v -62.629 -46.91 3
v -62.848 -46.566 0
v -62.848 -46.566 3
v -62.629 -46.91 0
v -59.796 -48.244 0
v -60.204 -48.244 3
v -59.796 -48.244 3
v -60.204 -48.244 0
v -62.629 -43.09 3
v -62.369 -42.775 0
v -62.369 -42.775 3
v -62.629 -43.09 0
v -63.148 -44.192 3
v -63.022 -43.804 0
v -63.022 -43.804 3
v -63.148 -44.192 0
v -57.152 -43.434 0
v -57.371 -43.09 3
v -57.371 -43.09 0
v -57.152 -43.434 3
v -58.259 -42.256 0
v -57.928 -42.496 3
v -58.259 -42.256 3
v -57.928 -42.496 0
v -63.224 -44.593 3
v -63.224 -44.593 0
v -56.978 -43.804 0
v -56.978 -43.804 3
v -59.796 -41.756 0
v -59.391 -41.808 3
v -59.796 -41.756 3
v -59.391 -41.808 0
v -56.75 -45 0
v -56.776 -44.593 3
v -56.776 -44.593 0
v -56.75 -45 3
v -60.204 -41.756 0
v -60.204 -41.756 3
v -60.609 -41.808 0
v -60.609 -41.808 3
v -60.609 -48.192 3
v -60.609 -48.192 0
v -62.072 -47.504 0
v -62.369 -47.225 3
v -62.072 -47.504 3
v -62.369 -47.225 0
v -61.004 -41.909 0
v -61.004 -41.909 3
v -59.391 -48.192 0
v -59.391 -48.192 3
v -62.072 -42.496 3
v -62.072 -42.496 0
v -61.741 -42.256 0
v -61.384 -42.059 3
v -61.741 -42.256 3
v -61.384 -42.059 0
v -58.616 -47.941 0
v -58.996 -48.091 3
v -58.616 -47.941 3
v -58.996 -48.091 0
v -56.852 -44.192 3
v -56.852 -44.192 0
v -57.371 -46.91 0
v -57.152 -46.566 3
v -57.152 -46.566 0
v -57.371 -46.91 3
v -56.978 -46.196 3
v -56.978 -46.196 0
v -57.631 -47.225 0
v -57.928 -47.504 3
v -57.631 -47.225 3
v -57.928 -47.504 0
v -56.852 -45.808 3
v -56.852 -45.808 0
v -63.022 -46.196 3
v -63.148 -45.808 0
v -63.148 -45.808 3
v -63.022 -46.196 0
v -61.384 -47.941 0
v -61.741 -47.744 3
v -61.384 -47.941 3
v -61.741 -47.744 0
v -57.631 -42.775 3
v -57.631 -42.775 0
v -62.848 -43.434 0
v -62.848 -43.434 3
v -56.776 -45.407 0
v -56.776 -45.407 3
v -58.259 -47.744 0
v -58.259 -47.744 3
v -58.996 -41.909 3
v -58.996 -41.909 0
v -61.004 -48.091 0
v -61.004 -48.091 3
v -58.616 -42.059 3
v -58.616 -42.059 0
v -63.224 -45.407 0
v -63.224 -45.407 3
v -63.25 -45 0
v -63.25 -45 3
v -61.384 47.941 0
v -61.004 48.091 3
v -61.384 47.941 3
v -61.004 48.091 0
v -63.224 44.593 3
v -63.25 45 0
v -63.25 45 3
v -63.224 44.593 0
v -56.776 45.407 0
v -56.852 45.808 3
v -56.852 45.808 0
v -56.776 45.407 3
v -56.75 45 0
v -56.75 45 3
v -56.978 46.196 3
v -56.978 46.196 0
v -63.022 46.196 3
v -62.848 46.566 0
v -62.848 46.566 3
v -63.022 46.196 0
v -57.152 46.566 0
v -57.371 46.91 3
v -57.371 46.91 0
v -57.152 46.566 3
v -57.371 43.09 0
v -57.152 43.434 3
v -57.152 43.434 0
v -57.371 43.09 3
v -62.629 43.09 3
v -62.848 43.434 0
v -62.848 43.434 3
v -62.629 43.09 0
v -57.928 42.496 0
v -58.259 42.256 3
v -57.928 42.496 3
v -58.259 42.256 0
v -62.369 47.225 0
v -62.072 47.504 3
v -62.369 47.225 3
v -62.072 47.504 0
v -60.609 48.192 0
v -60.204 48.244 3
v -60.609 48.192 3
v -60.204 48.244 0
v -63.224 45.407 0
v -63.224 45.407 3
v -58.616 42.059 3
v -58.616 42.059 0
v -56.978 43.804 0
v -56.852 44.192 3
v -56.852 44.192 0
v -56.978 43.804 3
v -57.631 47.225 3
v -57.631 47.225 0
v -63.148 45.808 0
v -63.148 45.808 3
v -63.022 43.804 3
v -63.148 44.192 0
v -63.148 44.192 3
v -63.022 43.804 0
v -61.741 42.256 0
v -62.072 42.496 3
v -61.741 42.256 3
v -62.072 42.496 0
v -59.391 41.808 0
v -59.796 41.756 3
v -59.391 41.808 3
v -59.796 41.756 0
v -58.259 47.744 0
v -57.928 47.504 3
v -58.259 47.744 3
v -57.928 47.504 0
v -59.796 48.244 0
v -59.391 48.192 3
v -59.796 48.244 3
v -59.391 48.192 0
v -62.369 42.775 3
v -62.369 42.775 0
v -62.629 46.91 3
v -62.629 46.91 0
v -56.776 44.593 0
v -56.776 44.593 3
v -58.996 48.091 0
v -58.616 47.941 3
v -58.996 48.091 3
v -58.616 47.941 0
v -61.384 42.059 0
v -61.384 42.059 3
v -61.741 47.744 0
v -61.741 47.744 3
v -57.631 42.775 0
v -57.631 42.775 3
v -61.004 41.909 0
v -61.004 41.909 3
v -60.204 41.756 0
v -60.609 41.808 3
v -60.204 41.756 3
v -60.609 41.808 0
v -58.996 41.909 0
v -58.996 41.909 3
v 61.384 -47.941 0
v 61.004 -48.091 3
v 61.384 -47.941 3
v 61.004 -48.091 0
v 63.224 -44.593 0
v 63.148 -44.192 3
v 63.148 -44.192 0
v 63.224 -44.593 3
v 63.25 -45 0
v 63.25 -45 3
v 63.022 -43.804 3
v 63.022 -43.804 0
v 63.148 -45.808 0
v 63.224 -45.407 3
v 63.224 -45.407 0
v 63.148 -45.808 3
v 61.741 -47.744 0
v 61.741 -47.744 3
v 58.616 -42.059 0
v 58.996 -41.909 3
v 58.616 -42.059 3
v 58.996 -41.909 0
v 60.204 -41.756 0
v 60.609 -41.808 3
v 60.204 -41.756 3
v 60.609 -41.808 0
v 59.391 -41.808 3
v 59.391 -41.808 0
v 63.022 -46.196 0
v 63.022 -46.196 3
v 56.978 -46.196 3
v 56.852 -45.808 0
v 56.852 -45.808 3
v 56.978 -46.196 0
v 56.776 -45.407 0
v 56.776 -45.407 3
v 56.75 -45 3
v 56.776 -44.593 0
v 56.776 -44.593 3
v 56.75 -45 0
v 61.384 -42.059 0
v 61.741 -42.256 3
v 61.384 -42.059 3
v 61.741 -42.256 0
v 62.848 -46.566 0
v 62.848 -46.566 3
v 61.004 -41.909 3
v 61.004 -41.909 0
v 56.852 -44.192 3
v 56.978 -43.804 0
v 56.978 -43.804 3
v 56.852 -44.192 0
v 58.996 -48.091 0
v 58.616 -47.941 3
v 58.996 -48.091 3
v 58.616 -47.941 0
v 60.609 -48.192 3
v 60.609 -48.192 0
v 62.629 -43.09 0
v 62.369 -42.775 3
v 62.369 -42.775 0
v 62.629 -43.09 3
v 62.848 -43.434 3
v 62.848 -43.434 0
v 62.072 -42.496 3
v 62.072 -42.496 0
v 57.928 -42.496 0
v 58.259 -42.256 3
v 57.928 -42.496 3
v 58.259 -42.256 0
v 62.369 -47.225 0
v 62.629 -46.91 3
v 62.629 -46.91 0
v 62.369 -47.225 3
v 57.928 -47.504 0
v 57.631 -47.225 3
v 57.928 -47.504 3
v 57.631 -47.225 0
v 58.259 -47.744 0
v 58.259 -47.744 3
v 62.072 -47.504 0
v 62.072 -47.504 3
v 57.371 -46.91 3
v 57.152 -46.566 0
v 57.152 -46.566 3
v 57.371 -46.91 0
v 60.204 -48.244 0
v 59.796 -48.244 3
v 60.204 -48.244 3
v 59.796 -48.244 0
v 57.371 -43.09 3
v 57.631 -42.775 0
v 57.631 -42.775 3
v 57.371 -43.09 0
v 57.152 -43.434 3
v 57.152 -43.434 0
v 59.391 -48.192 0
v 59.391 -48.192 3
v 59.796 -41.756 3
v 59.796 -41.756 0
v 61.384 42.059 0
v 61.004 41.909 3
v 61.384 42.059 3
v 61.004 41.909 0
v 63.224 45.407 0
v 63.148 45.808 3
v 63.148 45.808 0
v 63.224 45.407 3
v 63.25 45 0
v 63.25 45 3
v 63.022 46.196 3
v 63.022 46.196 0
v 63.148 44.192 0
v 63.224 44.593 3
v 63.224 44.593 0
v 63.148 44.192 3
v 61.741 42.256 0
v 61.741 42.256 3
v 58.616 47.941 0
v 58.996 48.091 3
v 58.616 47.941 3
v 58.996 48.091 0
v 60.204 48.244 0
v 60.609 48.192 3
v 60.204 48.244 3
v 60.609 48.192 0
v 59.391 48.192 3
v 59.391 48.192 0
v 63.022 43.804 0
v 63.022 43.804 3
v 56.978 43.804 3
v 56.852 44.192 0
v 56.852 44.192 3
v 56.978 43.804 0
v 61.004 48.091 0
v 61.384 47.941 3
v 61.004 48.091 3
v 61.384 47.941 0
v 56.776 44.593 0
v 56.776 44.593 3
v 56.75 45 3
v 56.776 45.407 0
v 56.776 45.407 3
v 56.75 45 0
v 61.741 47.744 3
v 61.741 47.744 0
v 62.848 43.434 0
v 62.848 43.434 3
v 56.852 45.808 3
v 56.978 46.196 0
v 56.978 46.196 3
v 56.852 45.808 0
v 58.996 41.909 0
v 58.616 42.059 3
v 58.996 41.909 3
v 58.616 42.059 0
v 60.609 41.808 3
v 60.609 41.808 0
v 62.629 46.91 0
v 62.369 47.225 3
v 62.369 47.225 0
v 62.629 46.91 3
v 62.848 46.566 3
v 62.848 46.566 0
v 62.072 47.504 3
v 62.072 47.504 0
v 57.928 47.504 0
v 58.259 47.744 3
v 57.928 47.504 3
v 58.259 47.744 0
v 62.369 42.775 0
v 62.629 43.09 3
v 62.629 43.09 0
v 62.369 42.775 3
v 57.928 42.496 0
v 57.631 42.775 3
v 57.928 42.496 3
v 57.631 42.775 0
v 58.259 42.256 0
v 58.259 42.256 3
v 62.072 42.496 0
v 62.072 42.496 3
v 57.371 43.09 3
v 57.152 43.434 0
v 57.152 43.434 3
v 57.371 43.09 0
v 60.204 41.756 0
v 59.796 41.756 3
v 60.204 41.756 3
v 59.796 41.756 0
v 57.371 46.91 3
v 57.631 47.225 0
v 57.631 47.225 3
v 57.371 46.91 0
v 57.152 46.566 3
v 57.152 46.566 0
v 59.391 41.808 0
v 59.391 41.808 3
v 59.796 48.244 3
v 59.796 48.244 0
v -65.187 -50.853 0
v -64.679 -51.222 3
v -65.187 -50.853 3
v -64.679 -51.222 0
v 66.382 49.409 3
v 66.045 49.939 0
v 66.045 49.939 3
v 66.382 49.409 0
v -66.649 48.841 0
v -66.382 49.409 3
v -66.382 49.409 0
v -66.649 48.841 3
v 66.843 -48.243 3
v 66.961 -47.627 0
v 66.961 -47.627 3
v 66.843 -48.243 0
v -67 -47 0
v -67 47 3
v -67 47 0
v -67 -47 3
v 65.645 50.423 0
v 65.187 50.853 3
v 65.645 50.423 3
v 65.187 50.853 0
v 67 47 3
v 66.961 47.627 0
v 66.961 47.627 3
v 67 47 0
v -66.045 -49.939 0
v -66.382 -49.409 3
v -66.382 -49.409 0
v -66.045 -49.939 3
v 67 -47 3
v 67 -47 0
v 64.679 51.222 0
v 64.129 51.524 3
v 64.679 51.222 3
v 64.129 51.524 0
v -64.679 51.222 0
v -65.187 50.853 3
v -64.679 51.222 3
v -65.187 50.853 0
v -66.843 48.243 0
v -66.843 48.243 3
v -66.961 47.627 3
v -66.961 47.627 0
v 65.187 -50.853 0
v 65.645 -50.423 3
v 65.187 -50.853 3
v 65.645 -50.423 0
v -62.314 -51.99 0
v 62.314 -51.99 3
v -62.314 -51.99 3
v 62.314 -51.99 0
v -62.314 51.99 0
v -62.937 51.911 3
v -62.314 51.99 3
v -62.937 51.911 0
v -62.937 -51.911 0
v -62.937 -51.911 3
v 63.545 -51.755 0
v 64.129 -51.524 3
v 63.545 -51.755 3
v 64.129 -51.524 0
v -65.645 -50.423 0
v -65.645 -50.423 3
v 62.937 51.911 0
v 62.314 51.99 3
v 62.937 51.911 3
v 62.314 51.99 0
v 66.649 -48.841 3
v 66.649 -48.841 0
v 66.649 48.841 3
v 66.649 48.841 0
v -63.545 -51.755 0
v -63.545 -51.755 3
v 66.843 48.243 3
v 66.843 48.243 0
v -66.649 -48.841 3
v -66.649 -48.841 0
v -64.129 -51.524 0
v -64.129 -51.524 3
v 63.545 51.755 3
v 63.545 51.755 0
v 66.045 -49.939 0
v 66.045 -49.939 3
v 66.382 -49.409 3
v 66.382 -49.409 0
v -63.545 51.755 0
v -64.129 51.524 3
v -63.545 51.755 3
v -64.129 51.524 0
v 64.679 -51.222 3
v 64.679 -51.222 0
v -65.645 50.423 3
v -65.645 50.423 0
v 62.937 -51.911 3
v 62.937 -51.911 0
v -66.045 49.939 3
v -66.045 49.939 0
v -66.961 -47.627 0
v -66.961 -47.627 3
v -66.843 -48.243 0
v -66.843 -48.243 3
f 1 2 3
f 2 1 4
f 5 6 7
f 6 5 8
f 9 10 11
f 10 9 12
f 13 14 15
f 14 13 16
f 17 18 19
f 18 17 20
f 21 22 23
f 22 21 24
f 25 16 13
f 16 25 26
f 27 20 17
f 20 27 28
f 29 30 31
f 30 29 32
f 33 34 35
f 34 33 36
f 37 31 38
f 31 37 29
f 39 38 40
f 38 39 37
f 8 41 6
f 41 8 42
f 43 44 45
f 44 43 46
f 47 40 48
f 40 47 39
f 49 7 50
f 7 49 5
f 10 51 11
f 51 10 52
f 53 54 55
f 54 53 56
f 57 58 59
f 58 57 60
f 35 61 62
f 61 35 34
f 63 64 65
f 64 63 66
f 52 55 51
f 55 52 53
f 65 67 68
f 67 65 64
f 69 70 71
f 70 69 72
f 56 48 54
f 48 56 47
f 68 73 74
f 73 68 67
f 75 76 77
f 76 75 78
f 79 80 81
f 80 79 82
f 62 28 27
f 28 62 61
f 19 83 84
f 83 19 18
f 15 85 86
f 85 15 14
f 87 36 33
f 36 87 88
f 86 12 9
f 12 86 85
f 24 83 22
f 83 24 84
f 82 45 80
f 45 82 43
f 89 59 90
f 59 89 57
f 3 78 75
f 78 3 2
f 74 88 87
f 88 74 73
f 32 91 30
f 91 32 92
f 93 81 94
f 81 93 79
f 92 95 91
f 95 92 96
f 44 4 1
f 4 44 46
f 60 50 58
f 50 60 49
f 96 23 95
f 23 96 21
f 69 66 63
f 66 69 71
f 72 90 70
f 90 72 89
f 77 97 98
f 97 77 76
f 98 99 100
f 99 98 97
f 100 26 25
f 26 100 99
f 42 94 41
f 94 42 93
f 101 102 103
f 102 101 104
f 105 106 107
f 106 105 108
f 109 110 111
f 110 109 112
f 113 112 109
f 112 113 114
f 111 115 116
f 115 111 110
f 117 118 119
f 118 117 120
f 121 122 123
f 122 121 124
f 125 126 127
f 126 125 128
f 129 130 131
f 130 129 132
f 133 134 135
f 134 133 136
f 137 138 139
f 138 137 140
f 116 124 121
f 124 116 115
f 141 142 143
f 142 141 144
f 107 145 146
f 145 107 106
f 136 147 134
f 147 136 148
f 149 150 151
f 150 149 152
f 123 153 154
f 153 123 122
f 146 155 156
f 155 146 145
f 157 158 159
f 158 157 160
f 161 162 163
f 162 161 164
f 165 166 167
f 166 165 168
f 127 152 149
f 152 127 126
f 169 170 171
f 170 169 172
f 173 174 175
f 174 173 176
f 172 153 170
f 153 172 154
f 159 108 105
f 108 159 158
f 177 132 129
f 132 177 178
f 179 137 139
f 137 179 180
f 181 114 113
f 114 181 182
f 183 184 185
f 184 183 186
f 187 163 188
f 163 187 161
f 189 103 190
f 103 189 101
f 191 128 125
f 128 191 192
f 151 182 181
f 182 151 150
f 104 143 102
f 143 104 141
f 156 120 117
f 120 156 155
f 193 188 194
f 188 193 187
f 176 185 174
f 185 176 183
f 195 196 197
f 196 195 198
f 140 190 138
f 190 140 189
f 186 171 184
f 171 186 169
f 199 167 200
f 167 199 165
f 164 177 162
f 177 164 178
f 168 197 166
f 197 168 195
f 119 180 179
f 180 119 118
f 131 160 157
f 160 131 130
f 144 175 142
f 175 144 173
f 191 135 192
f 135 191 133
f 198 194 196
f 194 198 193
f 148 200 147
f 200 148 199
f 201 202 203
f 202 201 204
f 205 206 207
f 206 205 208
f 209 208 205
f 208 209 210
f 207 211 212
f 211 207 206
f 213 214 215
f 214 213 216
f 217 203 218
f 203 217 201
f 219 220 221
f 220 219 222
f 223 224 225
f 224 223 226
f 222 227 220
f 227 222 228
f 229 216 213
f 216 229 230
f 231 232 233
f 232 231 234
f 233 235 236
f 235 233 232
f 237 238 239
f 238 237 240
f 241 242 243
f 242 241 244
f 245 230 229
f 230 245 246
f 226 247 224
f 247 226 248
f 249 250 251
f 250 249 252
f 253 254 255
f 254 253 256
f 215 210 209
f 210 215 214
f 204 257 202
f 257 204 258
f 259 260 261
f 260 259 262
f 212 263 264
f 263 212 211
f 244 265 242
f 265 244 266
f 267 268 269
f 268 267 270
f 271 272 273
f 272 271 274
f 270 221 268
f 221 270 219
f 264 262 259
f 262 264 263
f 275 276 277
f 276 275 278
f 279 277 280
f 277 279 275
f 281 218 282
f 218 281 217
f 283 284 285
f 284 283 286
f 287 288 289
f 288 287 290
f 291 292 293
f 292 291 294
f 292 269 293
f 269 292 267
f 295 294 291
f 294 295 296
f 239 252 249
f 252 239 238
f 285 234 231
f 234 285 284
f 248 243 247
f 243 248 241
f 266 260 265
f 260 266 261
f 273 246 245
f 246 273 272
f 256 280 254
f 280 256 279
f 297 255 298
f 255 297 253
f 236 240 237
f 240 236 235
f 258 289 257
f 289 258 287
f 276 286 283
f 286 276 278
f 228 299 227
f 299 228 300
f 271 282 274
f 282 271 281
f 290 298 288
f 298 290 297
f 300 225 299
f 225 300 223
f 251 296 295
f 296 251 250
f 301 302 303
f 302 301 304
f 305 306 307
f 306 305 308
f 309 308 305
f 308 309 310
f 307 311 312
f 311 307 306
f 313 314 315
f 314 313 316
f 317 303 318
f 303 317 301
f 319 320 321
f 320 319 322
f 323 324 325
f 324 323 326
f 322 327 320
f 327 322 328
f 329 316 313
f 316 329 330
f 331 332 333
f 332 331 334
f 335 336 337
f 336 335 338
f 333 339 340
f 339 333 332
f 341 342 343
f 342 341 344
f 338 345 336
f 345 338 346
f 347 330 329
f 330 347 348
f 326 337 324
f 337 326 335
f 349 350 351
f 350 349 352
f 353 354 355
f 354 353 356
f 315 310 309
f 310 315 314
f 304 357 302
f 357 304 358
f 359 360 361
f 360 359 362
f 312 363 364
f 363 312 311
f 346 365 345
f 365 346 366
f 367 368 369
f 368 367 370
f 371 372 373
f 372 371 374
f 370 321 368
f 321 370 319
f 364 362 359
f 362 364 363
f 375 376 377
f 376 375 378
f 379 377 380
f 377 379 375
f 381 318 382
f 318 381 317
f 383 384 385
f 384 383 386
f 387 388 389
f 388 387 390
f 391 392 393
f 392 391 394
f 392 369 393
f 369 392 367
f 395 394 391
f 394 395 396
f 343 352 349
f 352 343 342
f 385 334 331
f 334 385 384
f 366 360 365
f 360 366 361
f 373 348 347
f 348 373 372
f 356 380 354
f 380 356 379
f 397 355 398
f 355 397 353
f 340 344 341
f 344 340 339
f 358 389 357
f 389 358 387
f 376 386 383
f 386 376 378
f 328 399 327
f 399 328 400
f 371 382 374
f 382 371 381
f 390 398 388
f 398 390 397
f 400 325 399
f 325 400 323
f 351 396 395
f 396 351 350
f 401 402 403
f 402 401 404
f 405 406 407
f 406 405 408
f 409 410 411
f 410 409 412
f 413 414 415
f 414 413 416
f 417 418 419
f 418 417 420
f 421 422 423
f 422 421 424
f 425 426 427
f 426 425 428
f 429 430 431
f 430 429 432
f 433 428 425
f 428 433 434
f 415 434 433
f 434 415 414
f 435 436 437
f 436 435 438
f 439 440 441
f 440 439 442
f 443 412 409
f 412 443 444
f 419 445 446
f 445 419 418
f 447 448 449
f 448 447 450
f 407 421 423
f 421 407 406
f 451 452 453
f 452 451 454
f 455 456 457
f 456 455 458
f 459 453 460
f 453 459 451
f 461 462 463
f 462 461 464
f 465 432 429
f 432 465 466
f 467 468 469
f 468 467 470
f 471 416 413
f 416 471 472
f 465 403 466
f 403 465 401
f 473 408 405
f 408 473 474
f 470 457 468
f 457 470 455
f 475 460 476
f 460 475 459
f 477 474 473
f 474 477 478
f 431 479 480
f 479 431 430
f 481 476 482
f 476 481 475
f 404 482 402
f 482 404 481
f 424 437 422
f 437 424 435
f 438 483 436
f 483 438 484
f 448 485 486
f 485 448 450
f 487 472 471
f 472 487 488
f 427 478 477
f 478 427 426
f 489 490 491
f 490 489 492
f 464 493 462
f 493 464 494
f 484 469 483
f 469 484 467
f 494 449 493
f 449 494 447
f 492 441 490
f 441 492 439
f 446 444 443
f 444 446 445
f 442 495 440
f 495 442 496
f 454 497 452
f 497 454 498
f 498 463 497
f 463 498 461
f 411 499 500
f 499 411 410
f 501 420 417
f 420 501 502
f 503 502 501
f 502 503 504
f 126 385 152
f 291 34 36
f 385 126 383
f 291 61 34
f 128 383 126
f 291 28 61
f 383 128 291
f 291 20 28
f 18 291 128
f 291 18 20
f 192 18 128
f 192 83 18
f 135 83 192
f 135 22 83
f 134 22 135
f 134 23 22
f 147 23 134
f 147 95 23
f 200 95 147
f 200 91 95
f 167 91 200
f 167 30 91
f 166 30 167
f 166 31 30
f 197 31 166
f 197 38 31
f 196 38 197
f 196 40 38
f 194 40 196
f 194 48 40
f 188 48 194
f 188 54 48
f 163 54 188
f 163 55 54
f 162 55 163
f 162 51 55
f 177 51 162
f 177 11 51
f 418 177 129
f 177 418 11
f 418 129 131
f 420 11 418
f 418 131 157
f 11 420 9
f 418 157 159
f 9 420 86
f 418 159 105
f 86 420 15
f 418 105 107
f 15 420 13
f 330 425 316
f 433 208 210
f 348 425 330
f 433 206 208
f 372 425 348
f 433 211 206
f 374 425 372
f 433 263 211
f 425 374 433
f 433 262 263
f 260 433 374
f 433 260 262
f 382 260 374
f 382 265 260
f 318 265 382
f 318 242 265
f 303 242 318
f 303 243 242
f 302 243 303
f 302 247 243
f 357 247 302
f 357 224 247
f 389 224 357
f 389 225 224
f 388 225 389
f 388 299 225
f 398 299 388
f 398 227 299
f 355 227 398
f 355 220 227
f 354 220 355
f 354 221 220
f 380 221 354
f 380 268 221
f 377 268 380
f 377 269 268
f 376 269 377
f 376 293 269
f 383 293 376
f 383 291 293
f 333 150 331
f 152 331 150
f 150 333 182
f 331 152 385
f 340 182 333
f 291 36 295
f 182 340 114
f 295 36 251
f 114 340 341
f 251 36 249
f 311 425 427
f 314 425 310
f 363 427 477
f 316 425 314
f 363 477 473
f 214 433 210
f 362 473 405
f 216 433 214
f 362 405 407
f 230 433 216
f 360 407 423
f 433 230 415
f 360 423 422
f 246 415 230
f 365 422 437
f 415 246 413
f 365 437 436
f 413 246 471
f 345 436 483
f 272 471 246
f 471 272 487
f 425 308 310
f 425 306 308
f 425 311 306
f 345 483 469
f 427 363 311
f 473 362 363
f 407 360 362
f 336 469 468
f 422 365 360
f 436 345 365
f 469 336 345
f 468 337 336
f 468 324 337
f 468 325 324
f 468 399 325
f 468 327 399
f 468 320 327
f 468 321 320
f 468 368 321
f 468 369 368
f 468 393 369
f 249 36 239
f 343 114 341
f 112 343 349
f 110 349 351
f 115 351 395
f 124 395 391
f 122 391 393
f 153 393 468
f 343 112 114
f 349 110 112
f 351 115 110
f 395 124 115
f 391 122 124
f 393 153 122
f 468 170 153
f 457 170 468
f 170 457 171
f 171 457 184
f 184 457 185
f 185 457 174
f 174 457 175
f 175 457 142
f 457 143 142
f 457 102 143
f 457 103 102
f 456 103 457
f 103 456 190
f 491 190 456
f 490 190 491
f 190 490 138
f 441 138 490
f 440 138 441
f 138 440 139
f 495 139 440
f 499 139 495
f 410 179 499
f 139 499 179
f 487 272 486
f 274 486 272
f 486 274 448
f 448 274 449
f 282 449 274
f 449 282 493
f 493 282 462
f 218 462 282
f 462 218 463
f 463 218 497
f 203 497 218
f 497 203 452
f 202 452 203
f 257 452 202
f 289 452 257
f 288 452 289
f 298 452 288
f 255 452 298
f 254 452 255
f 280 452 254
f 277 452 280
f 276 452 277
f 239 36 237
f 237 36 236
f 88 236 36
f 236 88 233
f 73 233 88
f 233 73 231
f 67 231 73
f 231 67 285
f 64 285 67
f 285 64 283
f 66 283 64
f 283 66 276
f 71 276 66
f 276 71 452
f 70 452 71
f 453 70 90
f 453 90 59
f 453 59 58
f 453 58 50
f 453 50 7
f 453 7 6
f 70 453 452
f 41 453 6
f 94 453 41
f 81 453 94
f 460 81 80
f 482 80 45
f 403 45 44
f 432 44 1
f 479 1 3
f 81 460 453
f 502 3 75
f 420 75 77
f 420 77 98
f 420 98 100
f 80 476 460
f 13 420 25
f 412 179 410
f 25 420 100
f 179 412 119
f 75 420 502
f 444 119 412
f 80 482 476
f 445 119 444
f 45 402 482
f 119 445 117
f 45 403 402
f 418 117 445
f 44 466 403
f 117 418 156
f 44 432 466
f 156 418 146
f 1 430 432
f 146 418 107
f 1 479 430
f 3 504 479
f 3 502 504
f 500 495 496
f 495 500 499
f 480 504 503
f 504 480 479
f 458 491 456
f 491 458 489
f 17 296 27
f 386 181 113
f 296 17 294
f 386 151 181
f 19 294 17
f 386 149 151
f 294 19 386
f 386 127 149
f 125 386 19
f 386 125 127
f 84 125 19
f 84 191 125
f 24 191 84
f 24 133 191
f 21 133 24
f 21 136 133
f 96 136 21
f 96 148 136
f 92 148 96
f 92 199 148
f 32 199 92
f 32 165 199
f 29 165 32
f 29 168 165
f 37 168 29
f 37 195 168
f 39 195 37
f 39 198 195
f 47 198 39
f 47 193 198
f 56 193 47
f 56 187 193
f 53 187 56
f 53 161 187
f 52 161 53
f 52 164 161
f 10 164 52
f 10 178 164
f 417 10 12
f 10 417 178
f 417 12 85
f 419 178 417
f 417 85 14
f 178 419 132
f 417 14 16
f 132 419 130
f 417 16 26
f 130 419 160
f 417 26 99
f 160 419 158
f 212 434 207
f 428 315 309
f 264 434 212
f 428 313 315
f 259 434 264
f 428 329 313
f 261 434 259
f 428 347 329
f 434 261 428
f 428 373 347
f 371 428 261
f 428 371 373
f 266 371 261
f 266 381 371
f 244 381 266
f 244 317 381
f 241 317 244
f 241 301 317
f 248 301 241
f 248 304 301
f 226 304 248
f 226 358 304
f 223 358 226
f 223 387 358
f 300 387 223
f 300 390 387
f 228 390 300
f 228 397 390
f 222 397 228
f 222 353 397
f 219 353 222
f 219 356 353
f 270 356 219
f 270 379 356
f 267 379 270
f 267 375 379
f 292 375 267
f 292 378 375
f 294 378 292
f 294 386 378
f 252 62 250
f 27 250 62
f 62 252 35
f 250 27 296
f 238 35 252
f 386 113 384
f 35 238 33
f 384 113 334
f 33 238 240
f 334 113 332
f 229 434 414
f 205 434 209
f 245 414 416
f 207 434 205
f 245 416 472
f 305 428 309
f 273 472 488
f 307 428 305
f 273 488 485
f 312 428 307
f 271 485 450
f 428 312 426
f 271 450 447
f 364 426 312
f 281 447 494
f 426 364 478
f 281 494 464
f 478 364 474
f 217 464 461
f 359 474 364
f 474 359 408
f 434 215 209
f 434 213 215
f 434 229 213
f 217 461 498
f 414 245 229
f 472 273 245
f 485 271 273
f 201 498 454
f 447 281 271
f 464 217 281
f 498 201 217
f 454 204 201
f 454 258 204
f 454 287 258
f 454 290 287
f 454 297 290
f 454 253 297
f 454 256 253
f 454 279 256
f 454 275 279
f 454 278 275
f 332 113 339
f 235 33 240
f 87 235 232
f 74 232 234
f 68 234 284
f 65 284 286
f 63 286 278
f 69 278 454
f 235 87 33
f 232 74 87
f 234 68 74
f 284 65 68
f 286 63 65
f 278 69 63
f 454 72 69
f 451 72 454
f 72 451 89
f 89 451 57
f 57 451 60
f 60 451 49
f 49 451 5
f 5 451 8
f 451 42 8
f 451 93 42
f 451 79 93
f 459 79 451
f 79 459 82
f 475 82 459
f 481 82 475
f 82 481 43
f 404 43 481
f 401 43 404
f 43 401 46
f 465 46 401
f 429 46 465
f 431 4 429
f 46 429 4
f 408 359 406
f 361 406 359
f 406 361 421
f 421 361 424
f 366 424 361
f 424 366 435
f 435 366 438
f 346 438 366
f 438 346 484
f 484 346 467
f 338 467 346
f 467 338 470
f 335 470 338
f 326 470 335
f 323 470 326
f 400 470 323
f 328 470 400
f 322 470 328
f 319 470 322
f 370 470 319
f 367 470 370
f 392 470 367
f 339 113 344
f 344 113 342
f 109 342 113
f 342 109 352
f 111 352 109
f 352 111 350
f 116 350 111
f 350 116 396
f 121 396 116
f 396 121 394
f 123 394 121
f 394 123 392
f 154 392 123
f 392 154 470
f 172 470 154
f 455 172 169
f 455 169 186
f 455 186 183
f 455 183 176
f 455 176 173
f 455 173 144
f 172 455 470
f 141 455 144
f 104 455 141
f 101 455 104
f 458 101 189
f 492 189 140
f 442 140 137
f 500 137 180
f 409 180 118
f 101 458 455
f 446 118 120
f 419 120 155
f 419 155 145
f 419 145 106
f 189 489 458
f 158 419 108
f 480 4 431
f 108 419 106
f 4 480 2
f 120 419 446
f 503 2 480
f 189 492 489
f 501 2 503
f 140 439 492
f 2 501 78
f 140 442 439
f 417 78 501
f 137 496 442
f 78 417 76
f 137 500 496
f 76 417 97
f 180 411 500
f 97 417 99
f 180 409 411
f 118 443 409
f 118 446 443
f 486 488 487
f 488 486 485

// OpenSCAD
$fn = 50;


difference() {
	union() {
		hull() {
			translate(v = [-62.0000000000, 47.0000000000, 0]) {
				cylinder(h = 3, r = 5);
			}
			translate(v = [62.0000000000, 47.0000000000, 0]) {
				cylinder(h = 3, r = 5);
			}
			translate(v = [-62.0000000000, -47.0000000000, 0]) {
				cylinder(h = 3, r = 5);
			}
			translate(v = [62.0000000000, -47.0000000000, 0]) {
				cylinder(h = 3, r = 5);
			}
		}
	}
	union() {
		translate(v = [-60.0000000000, -45.0000000000, -100.0000000000]) {
			cylinder(h = 200, r = 3.2500000000);
		}
		translate(v = [-60.0000000000, 45.0000000000, -100.0000000000]) {
			cylinder(h = 200, r = 3.2500000000);
		}
		translate(v = [60.0000000000, -45.0000000000, -100.0000000000]) {
			cylinder(h = 200, r = 3.2500000000);
		}
		translate(v = [60.0000000000, 45.0000000000, -100.0000000000]) {
			cylinder(h = 200, r = 3.2500000000);
		}
	}
}
